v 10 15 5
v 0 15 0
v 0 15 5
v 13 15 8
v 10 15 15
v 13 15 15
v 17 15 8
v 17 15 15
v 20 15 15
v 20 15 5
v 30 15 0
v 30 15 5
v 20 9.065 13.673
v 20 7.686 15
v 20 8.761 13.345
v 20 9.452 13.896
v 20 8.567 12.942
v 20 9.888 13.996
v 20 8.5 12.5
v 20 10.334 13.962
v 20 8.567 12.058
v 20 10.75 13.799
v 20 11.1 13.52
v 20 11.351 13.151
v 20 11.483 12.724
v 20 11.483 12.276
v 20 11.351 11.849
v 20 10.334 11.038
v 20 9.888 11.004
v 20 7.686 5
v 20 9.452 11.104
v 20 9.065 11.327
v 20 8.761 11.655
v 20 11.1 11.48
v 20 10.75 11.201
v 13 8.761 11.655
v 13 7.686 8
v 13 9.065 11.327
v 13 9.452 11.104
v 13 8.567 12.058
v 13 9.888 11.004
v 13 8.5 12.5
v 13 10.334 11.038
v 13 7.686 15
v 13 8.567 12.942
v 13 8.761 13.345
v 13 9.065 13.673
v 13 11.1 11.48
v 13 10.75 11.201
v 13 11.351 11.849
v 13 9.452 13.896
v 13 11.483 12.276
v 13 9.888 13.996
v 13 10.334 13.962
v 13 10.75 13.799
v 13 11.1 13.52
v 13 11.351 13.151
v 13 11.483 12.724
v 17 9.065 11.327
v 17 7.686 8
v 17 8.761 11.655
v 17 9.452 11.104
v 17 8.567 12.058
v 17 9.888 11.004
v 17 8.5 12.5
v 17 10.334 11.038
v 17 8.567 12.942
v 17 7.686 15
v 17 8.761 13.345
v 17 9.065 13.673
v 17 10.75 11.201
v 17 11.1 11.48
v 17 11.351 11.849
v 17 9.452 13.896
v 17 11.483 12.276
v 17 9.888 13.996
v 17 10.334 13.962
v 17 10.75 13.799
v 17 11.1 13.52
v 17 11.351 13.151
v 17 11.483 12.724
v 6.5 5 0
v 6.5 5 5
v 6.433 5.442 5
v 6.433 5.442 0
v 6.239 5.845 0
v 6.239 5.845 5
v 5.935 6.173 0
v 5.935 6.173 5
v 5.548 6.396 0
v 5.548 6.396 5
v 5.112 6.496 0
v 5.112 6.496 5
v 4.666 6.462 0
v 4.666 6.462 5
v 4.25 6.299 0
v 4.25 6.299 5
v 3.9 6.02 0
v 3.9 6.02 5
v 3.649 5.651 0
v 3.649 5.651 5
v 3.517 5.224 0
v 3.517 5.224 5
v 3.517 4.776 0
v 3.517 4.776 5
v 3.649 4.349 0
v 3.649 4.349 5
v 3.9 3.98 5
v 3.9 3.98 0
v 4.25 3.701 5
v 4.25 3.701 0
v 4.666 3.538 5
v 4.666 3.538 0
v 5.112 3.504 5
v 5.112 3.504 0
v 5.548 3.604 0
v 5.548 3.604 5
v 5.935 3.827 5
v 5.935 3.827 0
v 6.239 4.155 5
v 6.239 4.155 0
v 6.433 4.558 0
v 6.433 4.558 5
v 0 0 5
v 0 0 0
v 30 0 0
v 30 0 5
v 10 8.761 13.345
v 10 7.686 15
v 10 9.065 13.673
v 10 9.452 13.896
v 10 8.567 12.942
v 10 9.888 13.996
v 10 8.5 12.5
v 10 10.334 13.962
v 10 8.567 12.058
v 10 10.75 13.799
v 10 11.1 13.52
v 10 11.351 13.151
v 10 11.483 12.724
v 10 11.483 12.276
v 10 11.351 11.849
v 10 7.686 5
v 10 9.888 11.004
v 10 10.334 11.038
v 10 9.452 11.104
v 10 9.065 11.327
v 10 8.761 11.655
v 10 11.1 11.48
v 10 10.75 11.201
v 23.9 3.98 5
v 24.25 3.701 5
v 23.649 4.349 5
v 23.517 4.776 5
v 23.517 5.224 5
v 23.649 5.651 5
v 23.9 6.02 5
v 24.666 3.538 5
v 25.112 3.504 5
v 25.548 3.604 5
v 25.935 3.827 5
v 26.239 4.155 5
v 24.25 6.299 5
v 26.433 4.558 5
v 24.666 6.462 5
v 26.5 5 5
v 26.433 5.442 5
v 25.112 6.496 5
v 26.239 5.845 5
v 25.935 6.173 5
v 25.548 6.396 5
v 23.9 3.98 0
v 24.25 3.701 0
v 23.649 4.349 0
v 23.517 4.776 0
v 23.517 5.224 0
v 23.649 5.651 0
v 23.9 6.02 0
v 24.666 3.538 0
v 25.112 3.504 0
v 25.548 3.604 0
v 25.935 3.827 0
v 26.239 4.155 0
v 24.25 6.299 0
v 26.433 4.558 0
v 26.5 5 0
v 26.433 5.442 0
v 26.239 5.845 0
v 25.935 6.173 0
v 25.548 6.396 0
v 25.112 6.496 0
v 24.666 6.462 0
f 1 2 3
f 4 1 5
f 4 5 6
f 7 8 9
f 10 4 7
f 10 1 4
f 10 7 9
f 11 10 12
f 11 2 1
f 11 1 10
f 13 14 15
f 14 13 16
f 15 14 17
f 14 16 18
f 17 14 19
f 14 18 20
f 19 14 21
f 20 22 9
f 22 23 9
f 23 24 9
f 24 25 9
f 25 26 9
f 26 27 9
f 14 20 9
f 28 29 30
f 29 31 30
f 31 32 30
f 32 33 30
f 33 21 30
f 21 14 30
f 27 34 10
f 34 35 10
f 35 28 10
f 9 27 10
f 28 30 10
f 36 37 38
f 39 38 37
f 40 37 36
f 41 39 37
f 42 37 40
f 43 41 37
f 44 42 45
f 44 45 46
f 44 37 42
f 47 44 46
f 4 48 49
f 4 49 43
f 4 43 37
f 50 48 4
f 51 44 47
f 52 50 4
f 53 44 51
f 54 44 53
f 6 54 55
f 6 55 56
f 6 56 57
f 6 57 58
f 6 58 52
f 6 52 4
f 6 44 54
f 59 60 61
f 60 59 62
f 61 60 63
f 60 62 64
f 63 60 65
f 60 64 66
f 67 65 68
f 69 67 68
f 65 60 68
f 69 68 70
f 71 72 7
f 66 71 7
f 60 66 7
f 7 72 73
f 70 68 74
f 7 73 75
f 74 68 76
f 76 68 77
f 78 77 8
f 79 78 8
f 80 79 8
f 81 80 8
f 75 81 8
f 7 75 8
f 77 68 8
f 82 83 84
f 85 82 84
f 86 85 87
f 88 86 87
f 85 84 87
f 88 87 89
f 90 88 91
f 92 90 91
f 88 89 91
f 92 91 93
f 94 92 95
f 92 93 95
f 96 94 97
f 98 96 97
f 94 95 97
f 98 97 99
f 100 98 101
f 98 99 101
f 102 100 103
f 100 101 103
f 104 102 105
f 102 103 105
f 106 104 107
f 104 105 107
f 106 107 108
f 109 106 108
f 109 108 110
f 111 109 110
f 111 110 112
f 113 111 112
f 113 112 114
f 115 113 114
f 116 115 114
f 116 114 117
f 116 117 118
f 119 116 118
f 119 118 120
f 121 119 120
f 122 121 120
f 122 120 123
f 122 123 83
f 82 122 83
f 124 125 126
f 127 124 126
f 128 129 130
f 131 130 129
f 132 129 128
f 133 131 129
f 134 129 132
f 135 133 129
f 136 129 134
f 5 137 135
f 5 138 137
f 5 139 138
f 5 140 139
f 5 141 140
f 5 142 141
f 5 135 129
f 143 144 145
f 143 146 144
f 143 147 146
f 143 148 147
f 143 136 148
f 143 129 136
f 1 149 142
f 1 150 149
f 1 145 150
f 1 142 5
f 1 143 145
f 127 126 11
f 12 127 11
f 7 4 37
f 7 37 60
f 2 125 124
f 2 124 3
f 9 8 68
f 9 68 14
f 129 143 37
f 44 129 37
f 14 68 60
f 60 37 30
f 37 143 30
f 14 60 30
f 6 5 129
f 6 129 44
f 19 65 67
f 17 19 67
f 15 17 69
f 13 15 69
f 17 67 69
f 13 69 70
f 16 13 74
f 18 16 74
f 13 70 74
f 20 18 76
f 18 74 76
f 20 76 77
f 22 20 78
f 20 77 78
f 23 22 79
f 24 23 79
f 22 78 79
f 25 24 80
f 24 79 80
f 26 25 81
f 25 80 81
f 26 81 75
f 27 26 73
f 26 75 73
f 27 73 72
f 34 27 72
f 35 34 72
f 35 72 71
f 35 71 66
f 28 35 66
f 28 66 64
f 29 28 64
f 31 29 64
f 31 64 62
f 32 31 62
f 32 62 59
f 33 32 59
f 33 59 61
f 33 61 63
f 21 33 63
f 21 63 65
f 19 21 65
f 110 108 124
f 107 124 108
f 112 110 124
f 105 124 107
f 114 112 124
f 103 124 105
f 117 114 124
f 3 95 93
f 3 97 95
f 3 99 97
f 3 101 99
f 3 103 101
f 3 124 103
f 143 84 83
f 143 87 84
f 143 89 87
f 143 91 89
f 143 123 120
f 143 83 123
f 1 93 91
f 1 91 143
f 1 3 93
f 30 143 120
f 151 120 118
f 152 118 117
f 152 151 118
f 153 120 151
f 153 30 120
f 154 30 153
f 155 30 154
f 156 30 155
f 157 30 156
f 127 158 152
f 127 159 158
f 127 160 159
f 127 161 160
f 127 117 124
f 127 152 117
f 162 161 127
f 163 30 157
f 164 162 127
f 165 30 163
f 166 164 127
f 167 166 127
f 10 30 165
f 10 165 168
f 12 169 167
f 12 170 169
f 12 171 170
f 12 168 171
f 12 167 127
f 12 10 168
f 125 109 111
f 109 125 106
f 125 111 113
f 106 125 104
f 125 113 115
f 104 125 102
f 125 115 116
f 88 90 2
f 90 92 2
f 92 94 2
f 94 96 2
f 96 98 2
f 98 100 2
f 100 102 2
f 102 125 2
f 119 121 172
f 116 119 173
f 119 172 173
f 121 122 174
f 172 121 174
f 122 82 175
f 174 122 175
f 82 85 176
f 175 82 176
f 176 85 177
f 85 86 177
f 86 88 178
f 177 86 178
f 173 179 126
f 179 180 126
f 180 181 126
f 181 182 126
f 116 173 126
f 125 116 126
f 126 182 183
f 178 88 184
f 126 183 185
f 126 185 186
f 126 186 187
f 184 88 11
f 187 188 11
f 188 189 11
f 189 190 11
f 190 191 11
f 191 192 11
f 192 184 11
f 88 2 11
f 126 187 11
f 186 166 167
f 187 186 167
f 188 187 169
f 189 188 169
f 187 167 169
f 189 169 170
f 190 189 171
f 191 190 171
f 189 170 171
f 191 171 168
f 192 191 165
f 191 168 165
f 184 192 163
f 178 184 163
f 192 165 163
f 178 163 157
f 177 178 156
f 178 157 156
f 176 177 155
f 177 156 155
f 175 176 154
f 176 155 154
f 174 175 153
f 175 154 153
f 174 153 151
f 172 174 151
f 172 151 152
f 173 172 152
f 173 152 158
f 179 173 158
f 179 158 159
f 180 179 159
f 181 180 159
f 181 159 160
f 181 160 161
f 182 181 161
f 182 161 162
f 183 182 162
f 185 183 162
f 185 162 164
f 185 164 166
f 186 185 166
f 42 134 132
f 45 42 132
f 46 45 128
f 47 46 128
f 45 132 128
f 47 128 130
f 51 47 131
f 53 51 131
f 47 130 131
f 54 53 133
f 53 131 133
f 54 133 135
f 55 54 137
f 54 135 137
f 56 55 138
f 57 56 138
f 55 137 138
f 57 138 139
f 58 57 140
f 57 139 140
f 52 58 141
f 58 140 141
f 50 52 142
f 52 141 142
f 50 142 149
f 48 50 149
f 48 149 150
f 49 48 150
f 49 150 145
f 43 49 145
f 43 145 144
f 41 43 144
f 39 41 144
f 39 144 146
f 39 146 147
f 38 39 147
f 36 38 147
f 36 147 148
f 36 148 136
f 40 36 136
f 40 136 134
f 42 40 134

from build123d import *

# Parameters (mm, degrees)
SKETCH_1_W          = 30
SKETCH_1_H          = 15
EXTRUDE_1_DEPTH     = 5
SKETCH_2_W          = 10
SKETCH_2_H          = 7.314170724
EXTRUDE_2_DEPTH     = 10
SKETCH_3_R          = 1.5
CUT_EXTRUDE_1_DEPTH = 6.5
SKETCH_4_W          = 4
SKETCH_4_H          = 7.314170724
CUT_EXTRUDE_2_DEPTH = 7
SKETCH_5_R          = 1.5
CUT_EXTRUDE_3_DEPTH = 15


with BuildPart() as part:
    # 草图1 → 凸台-拉伸1 (new body)
    with BuildSketch(Plane.XY):
        with Locations((15, 7.5)):
            Rectangle(SKETCH_1_W, SKETCH_1_H)
    extrude(amount=EXTRUDE_1_DEPTH)

    # 草图2 → 凸台-拉伸2 (add)
    with BuildSketch(Plane.XY.offset(5)):
        with Locations((15, 11.342914638)):
            Rectangle(SKETCH_2_W, SKETCH_2_H)
    extrude(amount=EXTRUDE_2_DEPTH)

    # 草图3 → 切除-拉伸1 (cut)
    with BuildSketch(Plane.XY.offset(5)):
        with Locations((5, 5)):
            Circle(SKETCH_3_R)
        with Locations((25, 5)):
            Circle(SKETCH_3_R)
    extrude(amount=-CUT_EXTRUDE_1_DEPTH, mode=Mode.SUBTRACT)

    # 草图4 → 切除-拉伸2 (cut)
    with BuildSketch(Plane.XY.offset(15)):
        with Locations((15, 11.342914638)):
            Rectangle(SKETCH_4_W, SKETCH_4_H)
    extrude(amount=-CUT_EXTRUDE_2_DEPTH, mode=Mode.SUBTRACT)

    # 草图5 → 切除-拉伸3 (cut)
    with BuildSketch(Plane.ZY.offset(-10)):
        with Locations(Location((12.5, 10, 0), (0, 0, 270))):
            Circle(SKETCH_5_R)
    extrude(amount=-CUT_EXTRUDE_3_DEPTH, mode=Mode.SUBTRACT)


solid = part.part
